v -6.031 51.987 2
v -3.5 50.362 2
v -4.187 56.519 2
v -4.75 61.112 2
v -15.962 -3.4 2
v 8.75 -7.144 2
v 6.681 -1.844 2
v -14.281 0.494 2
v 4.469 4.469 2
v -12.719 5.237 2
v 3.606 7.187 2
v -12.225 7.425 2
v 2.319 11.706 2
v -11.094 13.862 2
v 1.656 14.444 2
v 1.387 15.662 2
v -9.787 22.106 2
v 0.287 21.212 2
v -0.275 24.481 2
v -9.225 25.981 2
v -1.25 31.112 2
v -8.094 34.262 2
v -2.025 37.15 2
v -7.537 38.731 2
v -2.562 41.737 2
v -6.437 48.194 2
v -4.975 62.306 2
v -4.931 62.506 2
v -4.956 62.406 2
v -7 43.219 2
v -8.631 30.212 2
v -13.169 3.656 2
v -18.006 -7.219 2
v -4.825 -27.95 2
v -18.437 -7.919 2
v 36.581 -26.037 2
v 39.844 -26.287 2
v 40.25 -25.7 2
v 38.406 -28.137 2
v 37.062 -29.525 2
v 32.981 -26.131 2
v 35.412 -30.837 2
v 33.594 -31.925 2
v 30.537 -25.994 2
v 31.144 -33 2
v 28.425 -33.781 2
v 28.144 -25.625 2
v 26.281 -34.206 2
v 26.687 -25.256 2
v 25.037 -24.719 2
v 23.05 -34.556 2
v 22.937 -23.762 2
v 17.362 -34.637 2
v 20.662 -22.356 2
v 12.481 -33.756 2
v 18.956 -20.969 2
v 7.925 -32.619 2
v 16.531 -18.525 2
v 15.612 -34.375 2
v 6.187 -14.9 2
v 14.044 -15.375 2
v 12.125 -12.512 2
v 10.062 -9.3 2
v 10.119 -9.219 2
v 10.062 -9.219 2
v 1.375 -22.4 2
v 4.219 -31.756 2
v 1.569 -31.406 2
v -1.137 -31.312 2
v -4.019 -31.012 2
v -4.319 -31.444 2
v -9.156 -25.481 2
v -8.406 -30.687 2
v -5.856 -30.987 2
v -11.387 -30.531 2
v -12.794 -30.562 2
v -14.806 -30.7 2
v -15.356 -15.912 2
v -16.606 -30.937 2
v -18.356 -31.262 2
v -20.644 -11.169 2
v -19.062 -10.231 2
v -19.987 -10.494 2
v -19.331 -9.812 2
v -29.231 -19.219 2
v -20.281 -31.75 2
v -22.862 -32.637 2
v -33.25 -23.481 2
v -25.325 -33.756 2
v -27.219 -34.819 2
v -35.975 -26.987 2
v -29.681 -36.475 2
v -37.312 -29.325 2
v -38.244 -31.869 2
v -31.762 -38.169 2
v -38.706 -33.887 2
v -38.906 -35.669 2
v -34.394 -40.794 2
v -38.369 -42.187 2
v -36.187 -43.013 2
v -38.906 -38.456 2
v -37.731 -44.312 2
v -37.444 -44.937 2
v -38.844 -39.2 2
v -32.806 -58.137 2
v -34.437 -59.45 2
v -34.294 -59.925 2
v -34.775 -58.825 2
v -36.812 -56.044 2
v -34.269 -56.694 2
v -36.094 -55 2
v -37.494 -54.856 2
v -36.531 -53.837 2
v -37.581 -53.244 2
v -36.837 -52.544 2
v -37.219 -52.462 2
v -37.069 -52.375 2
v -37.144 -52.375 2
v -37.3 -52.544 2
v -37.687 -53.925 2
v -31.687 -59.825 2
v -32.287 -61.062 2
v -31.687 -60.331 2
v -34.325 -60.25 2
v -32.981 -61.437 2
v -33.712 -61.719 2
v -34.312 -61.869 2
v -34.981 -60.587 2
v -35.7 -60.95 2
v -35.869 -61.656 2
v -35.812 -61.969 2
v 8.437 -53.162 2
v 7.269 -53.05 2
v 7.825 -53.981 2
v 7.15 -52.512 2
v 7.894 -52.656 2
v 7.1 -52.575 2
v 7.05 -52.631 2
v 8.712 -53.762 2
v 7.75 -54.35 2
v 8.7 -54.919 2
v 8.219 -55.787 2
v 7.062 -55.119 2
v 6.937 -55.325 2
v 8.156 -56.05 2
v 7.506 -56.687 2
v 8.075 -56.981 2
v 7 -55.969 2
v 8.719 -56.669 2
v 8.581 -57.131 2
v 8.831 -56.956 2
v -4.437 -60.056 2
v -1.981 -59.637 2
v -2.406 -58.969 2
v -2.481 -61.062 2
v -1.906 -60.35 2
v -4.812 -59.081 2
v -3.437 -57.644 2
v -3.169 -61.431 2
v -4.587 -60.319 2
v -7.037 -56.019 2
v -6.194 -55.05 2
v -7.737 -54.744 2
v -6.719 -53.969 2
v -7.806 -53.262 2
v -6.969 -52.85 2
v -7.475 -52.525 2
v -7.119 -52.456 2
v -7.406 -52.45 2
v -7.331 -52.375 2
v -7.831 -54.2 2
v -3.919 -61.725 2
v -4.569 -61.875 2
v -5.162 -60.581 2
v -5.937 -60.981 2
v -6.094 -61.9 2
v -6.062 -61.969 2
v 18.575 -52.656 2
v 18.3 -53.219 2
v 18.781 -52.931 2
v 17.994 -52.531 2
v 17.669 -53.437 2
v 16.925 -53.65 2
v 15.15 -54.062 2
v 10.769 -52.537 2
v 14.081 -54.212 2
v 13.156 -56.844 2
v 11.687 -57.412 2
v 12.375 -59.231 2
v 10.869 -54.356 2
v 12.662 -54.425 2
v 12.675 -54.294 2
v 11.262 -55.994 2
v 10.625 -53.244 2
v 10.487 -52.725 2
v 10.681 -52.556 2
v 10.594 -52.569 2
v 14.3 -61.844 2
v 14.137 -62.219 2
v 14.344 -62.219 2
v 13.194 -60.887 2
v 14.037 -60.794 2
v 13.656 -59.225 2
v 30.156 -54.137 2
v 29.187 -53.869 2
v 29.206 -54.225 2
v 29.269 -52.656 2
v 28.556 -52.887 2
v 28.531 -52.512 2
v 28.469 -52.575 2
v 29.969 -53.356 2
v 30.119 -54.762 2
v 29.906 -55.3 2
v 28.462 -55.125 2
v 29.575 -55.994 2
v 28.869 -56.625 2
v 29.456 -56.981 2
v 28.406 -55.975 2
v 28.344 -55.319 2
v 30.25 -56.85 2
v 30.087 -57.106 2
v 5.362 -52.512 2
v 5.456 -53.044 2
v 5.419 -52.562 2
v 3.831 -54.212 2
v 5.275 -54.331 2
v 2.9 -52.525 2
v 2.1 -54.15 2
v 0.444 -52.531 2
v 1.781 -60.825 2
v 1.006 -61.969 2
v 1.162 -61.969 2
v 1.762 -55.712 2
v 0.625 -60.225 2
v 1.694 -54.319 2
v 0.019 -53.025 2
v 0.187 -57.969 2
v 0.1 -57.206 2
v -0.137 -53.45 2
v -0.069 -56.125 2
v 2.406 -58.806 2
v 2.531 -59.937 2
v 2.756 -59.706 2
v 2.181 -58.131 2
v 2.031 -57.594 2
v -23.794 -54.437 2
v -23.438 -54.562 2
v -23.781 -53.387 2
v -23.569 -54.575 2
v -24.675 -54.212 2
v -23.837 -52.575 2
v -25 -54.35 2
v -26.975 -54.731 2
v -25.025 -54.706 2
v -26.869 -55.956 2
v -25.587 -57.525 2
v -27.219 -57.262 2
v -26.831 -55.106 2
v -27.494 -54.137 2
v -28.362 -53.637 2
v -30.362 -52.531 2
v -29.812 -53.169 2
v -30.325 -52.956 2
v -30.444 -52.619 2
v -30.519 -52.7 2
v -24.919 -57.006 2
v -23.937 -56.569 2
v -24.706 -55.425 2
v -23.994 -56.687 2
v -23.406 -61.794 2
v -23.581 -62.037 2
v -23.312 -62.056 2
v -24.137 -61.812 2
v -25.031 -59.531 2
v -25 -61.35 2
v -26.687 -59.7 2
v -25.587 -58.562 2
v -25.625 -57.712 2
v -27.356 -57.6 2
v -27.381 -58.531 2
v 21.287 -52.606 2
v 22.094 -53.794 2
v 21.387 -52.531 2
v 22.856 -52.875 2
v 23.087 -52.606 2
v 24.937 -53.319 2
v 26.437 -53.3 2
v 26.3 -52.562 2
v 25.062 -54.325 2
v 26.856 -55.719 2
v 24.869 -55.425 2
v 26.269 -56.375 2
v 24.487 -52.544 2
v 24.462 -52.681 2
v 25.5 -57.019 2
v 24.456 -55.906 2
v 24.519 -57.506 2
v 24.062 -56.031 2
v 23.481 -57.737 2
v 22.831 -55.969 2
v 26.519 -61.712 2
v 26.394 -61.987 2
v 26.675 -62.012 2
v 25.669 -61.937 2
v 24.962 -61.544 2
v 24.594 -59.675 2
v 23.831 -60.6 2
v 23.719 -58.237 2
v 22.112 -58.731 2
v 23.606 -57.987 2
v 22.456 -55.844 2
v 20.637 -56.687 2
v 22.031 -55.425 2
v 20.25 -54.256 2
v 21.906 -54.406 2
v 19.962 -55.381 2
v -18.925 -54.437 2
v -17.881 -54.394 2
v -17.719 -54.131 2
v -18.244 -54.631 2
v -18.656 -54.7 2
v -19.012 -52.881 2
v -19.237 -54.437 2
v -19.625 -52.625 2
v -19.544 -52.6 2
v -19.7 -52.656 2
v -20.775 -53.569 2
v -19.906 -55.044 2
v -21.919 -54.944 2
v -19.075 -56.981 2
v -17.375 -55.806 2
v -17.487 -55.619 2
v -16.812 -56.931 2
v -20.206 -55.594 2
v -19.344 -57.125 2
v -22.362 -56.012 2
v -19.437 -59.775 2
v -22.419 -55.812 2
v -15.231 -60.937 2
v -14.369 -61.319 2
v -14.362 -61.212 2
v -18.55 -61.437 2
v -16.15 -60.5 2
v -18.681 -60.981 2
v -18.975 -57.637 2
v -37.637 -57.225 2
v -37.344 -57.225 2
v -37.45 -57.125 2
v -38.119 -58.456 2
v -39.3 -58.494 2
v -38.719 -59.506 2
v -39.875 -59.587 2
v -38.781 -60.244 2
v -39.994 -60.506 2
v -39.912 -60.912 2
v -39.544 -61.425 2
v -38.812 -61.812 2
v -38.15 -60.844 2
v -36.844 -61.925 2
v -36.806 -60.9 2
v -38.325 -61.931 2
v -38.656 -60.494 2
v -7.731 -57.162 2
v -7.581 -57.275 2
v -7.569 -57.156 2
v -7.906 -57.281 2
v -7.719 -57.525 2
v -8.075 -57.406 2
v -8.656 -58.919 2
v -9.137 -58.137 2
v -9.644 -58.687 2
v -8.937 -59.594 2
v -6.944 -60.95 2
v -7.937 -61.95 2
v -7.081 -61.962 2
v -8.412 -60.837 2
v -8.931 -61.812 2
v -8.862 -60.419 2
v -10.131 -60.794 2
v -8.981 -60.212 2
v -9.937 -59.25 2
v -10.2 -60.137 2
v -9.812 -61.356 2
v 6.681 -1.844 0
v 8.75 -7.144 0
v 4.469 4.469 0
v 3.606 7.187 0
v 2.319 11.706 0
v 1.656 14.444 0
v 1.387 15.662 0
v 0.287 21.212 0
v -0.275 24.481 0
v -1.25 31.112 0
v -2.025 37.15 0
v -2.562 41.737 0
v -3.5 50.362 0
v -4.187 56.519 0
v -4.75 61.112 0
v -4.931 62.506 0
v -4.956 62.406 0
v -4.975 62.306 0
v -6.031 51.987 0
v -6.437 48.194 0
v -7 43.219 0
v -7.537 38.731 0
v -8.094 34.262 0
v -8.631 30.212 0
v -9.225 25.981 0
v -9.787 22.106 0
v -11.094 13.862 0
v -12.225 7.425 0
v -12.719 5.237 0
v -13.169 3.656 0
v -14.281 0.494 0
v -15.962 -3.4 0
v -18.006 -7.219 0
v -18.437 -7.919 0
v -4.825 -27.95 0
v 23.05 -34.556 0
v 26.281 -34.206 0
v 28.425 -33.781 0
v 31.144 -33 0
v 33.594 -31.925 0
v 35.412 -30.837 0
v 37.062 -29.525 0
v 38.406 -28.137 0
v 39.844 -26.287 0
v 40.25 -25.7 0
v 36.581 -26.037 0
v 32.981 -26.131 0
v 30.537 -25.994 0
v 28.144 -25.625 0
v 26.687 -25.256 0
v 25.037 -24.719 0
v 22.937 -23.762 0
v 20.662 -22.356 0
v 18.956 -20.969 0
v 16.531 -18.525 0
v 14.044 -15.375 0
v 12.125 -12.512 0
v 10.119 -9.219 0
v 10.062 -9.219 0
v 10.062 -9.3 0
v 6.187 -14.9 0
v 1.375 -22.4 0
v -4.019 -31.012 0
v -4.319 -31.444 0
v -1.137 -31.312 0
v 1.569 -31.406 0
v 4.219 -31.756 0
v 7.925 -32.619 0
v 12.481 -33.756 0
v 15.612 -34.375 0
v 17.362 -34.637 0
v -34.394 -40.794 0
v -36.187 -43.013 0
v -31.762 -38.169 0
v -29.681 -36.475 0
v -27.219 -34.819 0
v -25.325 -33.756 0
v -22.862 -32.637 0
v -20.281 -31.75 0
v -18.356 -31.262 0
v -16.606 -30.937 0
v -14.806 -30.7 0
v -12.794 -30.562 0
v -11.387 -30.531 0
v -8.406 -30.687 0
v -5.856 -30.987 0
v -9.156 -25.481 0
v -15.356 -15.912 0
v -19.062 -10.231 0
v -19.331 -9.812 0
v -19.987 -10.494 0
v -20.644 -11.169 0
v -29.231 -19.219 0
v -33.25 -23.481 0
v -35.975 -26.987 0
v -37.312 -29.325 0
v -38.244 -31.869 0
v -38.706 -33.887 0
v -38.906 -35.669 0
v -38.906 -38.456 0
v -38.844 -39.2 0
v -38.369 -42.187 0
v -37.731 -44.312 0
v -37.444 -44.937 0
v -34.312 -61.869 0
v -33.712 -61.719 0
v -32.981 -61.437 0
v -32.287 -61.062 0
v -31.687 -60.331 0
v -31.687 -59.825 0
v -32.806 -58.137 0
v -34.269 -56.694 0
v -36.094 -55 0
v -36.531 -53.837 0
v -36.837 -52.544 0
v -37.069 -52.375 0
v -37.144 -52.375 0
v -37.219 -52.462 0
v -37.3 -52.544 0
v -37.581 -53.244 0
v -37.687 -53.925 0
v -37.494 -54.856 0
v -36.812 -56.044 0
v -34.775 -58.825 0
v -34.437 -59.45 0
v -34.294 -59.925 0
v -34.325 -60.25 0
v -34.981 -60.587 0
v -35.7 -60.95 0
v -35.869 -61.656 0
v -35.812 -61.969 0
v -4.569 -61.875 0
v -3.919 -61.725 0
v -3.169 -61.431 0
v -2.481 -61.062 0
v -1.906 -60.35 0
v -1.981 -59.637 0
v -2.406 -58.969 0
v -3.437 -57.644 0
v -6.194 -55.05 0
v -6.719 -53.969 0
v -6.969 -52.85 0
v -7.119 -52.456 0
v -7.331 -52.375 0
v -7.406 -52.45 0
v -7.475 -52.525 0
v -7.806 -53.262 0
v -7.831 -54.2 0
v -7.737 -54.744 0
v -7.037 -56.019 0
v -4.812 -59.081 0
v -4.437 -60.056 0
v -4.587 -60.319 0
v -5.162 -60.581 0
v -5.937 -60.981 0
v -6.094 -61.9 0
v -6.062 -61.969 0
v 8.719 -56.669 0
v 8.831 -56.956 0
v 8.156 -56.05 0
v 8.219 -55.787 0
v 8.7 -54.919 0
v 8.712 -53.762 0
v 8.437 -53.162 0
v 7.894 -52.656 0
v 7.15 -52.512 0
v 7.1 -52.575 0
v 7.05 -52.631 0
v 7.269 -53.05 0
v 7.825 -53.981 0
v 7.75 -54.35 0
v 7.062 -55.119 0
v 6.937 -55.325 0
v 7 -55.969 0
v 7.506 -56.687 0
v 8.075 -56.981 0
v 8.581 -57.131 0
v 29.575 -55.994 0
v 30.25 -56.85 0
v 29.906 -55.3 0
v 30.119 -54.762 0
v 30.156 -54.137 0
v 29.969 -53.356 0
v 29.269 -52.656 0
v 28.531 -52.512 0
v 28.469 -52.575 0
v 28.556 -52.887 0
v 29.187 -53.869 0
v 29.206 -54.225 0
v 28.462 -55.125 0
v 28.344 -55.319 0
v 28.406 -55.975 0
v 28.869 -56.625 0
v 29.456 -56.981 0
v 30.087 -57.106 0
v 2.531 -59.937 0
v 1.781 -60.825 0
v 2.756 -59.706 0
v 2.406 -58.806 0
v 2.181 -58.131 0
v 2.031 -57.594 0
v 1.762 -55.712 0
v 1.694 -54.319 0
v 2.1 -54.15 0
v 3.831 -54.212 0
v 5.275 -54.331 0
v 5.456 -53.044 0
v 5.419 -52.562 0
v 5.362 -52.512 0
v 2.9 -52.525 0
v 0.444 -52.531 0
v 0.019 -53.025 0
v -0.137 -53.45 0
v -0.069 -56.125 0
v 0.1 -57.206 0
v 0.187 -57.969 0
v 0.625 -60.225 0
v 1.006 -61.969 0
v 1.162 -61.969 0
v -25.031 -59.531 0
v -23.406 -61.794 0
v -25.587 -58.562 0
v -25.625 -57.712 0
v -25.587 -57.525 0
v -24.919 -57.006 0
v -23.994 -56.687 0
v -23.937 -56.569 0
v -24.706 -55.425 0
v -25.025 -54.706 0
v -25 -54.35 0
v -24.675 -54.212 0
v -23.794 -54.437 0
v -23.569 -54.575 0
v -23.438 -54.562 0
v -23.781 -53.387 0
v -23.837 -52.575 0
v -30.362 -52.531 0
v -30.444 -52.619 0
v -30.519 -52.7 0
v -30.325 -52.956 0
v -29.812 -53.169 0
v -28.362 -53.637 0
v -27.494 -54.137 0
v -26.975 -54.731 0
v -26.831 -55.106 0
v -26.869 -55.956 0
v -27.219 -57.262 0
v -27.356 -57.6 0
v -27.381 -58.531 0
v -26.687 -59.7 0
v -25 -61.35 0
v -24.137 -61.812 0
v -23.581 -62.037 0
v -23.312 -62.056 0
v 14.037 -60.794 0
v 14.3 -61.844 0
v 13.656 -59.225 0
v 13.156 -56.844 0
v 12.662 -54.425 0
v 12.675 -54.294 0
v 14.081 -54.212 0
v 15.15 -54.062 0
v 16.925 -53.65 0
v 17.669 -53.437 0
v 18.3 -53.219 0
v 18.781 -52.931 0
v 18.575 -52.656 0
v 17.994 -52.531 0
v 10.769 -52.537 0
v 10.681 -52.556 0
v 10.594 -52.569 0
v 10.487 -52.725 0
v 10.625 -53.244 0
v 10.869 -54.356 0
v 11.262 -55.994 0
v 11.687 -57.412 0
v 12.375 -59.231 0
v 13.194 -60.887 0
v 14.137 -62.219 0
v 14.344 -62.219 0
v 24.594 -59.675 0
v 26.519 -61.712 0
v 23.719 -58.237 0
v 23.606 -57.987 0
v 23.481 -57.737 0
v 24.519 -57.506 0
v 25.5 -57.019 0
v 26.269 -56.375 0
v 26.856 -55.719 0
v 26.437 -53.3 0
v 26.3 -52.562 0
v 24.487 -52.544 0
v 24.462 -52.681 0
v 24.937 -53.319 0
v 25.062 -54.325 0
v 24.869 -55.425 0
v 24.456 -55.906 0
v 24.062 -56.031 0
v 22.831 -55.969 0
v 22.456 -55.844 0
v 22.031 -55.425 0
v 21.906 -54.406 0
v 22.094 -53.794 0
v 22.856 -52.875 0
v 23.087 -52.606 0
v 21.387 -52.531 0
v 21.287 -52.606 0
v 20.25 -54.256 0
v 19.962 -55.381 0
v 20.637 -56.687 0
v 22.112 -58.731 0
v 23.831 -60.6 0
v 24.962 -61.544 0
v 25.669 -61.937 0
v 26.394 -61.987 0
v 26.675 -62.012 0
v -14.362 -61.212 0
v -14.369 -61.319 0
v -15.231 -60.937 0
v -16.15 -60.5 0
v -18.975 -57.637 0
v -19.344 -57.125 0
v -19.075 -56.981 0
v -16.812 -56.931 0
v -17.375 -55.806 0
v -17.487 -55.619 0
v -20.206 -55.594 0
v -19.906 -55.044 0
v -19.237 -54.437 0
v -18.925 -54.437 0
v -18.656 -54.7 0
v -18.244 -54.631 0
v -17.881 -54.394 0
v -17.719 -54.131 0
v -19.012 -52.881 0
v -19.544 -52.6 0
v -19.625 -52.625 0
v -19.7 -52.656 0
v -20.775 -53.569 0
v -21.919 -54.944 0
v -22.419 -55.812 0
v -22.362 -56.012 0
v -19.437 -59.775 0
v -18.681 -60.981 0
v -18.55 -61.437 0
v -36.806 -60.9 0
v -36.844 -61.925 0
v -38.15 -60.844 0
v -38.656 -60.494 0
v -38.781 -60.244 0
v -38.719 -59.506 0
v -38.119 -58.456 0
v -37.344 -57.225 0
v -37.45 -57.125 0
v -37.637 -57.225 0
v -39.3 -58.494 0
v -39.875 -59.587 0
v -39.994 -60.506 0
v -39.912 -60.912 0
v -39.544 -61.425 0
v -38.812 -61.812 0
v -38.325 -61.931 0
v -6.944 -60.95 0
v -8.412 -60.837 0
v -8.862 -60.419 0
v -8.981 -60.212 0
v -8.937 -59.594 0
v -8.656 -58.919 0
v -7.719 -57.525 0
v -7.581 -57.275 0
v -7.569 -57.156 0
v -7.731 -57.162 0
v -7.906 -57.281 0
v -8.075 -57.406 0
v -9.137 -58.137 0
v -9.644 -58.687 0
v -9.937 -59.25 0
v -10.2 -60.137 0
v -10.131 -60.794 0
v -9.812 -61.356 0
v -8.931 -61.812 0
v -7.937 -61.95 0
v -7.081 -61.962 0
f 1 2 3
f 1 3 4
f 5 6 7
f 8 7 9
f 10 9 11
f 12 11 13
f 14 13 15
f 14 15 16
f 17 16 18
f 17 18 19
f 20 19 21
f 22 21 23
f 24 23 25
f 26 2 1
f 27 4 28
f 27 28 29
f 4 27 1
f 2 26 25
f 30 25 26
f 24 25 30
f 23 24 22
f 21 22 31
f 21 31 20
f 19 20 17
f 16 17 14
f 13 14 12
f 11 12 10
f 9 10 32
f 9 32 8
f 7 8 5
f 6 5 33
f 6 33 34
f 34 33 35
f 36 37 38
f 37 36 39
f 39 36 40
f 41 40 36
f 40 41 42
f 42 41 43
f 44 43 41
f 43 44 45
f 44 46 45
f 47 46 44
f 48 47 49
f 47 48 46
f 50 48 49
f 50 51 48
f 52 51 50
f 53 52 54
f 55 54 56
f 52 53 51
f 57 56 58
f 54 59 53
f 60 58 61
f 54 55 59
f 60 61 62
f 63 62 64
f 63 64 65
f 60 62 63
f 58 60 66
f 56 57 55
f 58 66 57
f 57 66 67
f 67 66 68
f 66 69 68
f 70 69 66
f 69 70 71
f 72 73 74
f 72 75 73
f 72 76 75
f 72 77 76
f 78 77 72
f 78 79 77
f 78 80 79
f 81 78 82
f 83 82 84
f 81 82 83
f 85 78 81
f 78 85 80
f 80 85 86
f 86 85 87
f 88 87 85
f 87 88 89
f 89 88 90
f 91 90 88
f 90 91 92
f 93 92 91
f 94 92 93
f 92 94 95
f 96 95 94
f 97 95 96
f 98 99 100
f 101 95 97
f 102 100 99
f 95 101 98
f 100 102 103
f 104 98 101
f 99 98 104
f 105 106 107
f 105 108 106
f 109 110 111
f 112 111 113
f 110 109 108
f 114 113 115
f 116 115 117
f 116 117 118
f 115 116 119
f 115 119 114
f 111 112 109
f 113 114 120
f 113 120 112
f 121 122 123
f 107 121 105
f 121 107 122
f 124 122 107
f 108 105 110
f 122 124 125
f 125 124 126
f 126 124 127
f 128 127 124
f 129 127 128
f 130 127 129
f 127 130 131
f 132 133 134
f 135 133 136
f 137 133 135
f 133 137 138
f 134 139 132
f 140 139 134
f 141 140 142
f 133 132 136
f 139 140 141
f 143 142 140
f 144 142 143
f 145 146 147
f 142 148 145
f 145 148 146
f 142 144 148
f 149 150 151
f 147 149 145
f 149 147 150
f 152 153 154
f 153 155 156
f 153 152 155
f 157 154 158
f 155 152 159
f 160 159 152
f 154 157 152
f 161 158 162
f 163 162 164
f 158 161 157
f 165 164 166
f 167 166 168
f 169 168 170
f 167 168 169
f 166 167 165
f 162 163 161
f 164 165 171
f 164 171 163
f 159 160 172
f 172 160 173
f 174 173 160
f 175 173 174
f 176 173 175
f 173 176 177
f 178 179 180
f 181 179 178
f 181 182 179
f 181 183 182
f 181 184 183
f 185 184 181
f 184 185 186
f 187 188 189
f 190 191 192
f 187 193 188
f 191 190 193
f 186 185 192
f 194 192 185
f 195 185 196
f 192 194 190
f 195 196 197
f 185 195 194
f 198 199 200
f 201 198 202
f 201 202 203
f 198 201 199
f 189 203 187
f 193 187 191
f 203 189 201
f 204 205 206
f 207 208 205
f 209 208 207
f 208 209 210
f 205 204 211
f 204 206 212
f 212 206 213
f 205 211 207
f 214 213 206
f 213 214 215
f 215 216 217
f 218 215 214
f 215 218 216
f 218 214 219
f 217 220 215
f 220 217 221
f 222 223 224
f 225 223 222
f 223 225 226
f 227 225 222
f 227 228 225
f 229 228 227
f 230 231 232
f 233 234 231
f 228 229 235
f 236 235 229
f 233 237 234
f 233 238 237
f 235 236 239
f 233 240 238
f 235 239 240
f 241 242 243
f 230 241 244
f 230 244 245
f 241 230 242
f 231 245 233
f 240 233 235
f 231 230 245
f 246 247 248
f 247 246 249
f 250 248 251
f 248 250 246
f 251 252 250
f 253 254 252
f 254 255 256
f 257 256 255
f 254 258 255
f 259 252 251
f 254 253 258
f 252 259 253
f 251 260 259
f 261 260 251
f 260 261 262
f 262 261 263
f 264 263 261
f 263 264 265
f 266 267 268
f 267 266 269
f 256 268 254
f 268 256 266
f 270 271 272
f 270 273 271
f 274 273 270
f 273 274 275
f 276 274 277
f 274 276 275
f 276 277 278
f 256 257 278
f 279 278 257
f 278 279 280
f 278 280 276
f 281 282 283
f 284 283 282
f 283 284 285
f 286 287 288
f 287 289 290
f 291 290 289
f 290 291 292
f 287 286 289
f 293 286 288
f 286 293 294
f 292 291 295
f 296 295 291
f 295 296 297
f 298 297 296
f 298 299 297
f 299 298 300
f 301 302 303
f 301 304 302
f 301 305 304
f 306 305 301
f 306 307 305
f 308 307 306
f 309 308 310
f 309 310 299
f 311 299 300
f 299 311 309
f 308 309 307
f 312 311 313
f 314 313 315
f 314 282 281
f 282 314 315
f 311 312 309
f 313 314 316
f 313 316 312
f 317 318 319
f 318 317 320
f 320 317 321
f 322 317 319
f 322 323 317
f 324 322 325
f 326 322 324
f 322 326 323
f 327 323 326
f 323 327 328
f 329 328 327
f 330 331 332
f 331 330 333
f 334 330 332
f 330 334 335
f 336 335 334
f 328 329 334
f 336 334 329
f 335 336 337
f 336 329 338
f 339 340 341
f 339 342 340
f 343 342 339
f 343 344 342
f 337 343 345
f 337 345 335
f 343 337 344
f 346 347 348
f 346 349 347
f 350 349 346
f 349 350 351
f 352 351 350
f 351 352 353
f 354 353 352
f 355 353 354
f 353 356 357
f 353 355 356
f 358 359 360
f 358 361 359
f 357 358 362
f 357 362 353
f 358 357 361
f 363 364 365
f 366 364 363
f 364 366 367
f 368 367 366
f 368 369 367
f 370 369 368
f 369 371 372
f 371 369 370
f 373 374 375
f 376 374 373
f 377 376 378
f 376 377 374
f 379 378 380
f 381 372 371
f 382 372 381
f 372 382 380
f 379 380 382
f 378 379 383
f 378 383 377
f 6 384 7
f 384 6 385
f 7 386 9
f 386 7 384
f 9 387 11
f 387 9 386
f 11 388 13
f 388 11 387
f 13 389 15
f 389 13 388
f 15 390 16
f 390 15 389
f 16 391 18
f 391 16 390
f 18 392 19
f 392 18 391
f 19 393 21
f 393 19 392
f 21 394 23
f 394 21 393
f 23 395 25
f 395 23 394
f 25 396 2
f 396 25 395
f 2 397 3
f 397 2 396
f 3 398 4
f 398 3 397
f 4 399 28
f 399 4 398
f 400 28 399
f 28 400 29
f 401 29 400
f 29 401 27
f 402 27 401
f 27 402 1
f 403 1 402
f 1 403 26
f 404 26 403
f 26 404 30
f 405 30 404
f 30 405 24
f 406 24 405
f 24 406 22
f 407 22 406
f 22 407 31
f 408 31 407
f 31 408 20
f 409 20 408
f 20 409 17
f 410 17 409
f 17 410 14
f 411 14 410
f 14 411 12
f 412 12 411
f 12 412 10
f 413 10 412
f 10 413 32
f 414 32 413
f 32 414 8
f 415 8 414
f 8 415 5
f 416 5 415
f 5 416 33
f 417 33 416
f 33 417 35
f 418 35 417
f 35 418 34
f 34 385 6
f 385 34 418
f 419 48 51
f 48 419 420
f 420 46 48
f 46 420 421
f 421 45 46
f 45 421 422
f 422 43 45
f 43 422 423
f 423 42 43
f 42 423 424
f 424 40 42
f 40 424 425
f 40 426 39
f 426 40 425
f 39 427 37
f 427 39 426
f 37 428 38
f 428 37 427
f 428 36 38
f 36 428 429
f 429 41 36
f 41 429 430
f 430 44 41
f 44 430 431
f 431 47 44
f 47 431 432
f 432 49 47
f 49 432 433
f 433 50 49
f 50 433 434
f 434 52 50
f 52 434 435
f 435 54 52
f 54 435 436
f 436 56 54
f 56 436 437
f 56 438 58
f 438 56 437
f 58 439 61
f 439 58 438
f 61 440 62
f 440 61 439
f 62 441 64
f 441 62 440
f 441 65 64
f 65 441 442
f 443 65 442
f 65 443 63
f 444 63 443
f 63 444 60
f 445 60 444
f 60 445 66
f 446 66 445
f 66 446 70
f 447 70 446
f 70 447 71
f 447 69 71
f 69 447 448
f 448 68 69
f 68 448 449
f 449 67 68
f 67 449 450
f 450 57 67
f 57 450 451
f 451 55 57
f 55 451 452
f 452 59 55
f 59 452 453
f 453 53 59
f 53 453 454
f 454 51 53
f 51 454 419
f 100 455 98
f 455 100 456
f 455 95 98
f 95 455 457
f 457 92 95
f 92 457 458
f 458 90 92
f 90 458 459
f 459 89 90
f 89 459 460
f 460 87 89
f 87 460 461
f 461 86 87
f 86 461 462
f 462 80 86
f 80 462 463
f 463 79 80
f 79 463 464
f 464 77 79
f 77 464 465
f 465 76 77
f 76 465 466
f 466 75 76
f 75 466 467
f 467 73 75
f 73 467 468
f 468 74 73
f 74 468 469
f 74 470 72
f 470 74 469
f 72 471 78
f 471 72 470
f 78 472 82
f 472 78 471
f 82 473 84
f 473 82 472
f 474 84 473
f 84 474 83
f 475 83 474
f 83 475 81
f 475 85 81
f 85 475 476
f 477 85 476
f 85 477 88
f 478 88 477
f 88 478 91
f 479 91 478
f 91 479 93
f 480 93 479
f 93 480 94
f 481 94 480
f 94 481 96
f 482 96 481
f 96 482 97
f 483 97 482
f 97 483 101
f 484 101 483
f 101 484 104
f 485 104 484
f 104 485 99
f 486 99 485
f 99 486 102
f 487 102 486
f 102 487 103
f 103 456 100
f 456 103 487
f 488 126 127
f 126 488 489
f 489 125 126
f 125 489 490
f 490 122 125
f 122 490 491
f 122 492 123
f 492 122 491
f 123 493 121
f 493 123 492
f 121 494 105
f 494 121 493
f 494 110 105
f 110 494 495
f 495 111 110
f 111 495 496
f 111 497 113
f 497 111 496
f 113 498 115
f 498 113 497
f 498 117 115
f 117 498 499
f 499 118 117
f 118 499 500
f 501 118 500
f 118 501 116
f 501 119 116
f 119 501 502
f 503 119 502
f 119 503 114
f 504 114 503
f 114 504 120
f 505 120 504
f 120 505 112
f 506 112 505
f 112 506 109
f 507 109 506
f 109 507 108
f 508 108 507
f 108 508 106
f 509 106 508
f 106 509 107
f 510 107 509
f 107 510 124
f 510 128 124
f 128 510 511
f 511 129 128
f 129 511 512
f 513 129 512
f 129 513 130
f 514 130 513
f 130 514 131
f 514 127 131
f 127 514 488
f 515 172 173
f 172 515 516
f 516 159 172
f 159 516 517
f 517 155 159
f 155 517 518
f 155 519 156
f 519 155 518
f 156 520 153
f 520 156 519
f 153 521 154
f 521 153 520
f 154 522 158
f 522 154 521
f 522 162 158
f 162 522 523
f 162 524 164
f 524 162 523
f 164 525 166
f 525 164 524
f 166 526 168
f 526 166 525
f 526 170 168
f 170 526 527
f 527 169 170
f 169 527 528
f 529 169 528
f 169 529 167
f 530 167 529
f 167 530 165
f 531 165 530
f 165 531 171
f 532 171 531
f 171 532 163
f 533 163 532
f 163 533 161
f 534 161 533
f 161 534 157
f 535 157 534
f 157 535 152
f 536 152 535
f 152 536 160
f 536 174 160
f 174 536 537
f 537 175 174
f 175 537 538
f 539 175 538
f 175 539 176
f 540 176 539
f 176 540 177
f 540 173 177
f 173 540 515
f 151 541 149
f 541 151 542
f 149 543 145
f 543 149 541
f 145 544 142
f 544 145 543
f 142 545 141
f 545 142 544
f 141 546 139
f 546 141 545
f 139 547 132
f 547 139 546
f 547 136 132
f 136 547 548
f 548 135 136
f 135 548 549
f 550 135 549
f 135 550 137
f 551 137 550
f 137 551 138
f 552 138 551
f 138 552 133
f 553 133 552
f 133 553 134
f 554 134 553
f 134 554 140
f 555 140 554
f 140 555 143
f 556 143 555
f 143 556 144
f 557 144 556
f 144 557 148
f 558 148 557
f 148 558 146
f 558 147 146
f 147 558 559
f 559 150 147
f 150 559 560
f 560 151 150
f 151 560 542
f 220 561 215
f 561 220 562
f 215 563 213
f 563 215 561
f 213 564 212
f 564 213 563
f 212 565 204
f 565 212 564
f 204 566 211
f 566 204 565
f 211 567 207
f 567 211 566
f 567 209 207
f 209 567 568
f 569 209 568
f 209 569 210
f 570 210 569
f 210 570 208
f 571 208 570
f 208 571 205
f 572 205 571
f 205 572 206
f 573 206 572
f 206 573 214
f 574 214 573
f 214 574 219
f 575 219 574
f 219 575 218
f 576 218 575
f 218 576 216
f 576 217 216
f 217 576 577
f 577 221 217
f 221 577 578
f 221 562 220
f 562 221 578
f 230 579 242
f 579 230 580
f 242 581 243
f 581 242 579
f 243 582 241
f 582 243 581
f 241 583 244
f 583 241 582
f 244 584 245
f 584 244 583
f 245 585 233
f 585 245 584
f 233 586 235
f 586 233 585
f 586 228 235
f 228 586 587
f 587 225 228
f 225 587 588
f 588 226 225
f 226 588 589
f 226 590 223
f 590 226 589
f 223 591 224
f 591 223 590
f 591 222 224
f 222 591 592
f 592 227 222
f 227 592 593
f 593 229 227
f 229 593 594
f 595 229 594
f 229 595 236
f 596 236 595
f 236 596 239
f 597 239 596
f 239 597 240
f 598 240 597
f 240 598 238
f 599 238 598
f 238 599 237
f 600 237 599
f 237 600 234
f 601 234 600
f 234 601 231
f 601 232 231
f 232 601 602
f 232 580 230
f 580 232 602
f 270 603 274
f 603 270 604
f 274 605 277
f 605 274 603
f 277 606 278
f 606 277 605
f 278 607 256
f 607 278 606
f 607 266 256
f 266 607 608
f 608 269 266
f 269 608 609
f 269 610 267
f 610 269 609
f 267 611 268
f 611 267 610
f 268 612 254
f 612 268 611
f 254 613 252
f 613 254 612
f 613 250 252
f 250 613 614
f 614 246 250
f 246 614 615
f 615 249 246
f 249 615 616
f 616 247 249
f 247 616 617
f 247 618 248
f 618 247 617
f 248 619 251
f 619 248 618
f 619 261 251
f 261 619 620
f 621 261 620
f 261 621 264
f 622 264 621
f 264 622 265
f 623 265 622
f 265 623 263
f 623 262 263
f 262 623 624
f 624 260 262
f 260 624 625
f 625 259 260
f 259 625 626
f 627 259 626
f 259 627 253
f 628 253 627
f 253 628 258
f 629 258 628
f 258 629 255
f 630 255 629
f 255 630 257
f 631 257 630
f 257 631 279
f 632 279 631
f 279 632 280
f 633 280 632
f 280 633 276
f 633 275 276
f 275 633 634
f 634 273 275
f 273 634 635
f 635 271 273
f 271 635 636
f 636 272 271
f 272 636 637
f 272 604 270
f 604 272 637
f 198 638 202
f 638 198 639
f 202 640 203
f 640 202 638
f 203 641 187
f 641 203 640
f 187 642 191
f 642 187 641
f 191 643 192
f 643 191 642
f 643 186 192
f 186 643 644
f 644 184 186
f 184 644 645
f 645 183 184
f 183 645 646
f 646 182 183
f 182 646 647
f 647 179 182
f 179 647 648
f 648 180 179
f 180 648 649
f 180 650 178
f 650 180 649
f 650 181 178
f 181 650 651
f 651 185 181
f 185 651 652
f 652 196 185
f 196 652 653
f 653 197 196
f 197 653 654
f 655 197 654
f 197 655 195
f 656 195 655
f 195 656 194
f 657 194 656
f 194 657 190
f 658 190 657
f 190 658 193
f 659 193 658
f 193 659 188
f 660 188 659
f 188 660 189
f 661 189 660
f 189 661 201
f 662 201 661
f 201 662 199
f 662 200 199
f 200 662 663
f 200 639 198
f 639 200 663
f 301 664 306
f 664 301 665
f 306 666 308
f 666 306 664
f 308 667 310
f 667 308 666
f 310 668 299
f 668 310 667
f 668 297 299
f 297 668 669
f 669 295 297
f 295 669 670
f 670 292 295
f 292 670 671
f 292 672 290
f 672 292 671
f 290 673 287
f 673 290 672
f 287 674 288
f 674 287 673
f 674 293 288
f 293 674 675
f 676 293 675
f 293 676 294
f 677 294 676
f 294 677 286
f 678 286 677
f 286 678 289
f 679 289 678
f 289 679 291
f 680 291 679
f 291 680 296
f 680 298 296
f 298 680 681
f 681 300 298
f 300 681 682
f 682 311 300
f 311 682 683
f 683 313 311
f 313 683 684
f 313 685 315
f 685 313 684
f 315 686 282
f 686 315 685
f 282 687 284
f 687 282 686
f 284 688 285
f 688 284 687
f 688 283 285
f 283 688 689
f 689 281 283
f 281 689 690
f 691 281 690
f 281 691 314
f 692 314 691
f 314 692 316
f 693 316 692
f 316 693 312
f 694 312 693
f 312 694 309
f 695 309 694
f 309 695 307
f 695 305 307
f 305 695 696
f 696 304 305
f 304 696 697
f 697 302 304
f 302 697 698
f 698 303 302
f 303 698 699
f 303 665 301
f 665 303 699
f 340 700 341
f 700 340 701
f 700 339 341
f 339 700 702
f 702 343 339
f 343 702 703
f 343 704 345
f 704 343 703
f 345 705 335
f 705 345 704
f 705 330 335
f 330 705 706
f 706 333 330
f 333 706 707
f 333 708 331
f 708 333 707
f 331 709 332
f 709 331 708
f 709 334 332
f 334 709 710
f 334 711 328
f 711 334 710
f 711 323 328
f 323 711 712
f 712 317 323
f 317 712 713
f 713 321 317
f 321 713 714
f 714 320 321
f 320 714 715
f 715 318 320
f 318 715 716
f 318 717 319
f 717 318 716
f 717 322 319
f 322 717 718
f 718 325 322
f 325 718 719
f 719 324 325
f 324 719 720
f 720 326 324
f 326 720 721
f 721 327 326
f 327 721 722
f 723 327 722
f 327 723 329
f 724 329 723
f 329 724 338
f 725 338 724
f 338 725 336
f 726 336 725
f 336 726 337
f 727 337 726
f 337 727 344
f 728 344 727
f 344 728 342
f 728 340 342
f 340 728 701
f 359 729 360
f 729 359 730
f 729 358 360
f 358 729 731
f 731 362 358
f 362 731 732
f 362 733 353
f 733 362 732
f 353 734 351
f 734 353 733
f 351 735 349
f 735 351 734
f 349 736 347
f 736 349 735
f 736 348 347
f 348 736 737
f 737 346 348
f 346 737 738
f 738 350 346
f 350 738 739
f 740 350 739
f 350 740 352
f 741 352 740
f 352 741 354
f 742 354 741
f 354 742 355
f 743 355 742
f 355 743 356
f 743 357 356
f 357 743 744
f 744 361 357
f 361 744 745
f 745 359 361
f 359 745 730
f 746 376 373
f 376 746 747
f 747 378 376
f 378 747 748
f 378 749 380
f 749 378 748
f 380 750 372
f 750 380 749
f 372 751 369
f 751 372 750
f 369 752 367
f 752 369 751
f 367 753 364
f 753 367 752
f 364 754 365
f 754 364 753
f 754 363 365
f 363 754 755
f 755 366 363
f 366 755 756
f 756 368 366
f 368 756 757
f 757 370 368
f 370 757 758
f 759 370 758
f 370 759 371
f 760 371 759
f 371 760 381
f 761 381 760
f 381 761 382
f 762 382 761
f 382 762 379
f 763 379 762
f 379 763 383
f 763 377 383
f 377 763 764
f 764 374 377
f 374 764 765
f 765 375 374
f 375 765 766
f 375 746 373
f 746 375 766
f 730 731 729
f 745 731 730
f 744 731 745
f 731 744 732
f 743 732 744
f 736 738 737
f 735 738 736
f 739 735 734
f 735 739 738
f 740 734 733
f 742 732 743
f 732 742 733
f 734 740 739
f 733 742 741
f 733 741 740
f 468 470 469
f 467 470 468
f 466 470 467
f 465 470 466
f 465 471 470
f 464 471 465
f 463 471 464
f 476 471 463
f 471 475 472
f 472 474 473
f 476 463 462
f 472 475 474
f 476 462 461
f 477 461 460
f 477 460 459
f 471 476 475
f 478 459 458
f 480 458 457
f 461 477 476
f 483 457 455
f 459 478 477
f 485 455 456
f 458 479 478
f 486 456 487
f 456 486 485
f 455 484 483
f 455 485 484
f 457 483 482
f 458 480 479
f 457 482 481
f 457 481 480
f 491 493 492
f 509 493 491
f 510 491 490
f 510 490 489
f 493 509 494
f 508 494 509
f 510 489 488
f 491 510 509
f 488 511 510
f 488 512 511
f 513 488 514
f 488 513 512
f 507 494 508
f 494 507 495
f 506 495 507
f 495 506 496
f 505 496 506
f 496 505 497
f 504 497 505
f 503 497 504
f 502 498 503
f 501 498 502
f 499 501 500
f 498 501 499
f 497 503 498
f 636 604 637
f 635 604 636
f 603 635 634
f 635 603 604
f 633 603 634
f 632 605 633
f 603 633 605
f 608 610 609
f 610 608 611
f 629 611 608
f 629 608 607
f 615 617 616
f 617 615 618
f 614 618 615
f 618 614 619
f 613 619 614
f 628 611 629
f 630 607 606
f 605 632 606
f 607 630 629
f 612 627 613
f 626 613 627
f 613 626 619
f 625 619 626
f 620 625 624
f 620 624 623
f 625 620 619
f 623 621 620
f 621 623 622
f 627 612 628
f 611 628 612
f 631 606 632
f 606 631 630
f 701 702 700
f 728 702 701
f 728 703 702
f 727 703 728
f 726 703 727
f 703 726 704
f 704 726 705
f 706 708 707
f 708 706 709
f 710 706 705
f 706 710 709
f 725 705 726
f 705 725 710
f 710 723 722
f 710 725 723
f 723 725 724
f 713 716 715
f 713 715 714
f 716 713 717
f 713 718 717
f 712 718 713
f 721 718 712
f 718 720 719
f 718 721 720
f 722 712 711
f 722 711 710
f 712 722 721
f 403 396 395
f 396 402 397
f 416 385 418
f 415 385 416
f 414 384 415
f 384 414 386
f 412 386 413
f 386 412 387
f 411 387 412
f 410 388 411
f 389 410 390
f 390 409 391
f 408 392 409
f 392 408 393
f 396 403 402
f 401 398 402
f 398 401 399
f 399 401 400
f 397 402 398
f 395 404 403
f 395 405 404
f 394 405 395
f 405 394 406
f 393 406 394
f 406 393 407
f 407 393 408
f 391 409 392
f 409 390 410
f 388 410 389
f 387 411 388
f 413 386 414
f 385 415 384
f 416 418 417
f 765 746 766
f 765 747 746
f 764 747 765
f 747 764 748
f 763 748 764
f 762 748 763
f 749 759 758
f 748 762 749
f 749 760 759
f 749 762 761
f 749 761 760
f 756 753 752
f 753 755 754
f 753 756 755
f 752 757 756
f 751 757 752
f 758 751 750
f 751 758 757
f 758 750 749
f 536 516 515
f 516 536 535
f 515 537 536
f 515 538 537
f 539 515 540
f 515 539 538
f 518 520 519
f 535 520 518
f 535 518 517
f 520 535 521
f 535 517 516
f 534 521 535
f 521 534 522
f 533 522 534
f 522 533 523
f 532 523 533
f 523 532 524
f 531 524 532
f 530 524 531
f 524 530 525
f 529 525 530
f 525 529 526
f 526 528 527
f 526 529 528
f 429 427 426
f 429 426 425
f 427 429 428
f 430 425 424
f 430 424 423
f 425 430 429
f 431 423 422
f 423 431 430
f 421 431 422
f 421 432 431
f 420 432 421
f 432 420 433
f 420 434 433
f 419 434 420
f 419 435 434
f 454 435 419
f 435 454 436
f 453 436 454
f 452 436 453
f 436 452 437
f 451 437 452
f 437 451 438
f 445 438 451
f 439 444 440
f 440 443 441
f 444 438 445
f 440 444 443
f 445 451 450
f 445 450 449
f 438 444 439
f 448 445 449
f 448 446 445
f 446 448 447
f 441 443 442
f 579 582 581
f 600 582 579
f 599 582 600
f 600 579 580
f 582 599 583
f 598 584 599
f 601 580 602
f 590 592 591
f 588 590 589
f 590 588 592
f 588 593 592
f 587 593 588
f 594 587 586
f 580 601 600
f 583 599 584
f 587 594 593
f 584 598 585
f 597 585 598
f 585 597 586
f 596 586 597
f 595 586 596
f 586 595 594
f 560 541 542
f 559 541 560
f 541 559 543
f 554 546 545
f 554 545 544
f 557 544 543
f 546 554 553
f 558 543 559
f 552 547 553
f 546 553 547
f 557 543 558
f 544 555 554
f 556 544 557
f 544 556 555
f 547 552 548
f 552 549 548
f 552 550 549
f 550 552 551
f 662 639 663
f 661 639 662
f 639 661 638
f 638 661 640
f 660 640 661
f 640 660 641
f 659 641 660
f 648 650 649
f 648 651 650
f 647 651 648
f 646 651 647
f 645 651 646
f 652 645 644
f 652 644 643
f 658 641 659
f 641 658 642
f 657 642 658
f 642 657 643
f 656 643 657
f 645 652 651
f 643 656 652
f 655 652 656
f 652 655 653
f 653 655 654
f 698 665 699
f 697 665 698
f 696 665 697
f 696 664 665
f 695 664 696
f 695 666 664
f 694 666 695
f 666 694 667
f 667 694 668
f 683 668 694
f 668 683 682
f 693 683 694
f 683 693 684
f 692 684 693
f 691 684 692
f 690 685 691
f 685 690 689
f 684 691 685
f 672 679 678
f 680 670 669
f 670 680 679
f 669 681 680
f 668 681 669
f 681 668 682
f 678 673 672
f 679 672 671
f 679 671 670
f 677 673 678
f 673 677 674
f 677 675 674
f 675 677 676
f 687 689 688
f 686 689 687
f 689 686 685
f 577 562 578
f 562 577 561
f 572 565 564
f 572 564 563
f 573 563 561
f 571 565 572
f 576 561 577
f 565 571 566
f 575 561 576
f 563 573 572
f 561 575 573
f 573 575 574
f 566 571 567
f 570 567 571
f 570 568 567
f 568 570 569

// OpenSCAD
module 61a49e6b5466c818e99b627d7e38d7b3_1()
{
 /* Generated by trace2scad version 20150415
    http://aggregate.org/MAKE/TRACE2SCAD/
    Optimized model has 387/4796 original points
 */
 color([0.48, 0.48, 0.48])
 assign(minx=0) /* polygon minx=39 */
 assign(miny=0) /* polygon miny=45 */
 assign(maxx=12880) /* polygon maxx=12880 */
 assign(maxy=20000) /* polygon maxy=20001 */
 assign(dx=maxx-minx)
 assign(dy=maxy-miny)
 assign(maxd=((dx>dy)?dx:dy))
 scale([1/maxd, 1/maxd, 1])
 translate([-minx-dx/2, -miny-dy/2, 0])
 linear_extrude(height=1, convexity=387)
 union() {
  union() {
   polygon([[5647,19985],[5644,19969],[5475,18318],[5410,17711],[5320,16915],[5234,16197],[5145,15482],[5059,14834],[4964,14157],[4874,13537],[4665,12218],[4484,11188],[4405,10838],[4333,10585],[4155,10079],[3886,9456],[3559,8845],[3490,8733],[5668,5528],[7840,8857],[7509,9705],[7155,10715],[7017,11150],[6811,11873],[6705,12311],[6662,12506],[6486,13394],[6396,13917],[6240,14978],[6116,15944],[6030,16678],[5880,18058],[5770,19043],[5680,19778],[5651,20001]], convexity=6);
   polygon([[8050,8518],[8050,8512],[7430,7616],[6660,6416],[5797,5038],[5749,4969],[6258,4990],[6691,4975],[7115,4919],[7708,4781],[8437,4599],[8938,4500],[9218,4458],[10128,4471],[10645,4527],[10988,4595],[11423,4720],[11815,4892],[12106,5066],[12370,5276],[12585,5498],[12815,5794],[12880,5888],[12293,5834],[11717,5819],[11326,5841],[10943,5900],[10710,5959],[10446,6045],[10110,6198],[9746,6423],[9473,6645],[9085,7036],[8687,7540],[8380,7998],[8059,8525],[8050,8525]], convexity=9);
   polygon([[3242,8321],[3137,8213],[1763,6925],[1120,6243],[684,5682],[470,5308],[321,4901],[247,4578],[215,4293],[215,3847],[225,3728],[301,3250],[403,2910],[449,2810],[650,3118],[937,3473],[1358,3893],[1691,4164],[2085,4429],[2388,4599],[2782,4778],[3195,4920],[3503,4998],[3783,5050],[4071,5088],[4393,5110],[4618,5115],[5095,5090],[5503,5042],[4975,5923],[3983,7454],[3390,8363],[3347,8430]], convexity=7);
   polygon([[485,1606],[472,1593],[427,1481],[410,1372],[441,1223],[550,1033],[876,588],[930,488],[953,412],[948,360],[843,306],[728,248],[701,135],[710,85],[950,101],[1046,125],[1163,170],[1274,230],[1370,347],[1370,428],[1191,698],[957,929],[665,1200],[595,1386],[546,1593],[509,1620],[497,1620]], convexity=8);
   polygon([[5255,1608],[5244,1596],[5191,1478],[5187,1328],[5202,1241],[5314,1037],[5670,547],[5730,391],[5706,349],[5614,307],[5490,243],[5465,96],[5470,85],[5709,100],[5813,124],[5933,171],[6043,230],[6135,344],[6123,458],[6055,565],[5890,777],[5449,1192],[5365,1365],[5325,1544],[5301,1607],[5267,1620]], convexity=8);
   polygon([[6904,1596],[6511,1595],[6443,1516],[6418,1448],[6429,1020],[6456,847],[6470,725],[6540,364],[6601,85],[6626,85],[6725,268],[6845,410],[6881,447],[6825,591],[6789,699],[6765,785],[6722,1086],[6711,1309],[6776,1336],[7053,1326],[7284,1307],[7313,1513],[7307,1590],[7298,1598]], convexity=10);
   polygon([[7576,1588],[7568,1579],[7603,1512],[7692,1363],[7680,1304],[7570,1181],[7550,1148],[7560,1045],[7641,930],[7732,883],[7813,859],[7853,887],[7835,933],[7745,1032],[7755,1074],[7832,1213],[7834,1398],[7790,1494],[7703,1575],[7584,1598]], convexity=10);
   polygon([[11000,1593],[10995,1588],[11009,1538],[11110,1381],[11113,1324],[10994,1180],[10975,1149],[10985,1044],[11059,940],[11153,883],[11254,863],[11280,904],[11172,1041],[11225,1152],[11259,1238],[11265,1338],[11235,1463],[11123,1575],[11005,1598]], convexity=10);
   polygon([[1569,1581],[1557,1568],[1588,1527],[1670,1493],[1902,1418],[2041,1338],[2124,1243],[2147,1183],[2141,1047],[2085,838],[2063,784],[2059,635],[2170,448],[2440,184],[2578,110],[2667,74],[2710,71],[2695,113],[2435,475],[2346,630],[2340,766],[2346,796],[2453,879],[2601,930],[2610,949],[2487,1132],[2436,1247],[2440,1304],[2492,1326],[2633,1290],[2669,1268],[2690,1270],[2635,1458],[2626,1588],[1582,1595]], convexity=13);
   polygon([[8149,1591],[8135,1589],[8118,1564],[8140,1481],[8179,1303],[8242,1041],[8310,814],[8420,523],[8551,258],[8702,45],[8735,45],[8728,105],[8686,273],[8625,524],[8545,905],[8466,1292],[8468,1313],[8693,1326],[8864,1350],[9148,1416],[9267,1450],[9368,1485],[9445,1531],[9412,1575],[9319,1595],[8163,1594]], convexity=9);
   polygon([[9854,1589],[9846,1583],[9680,1319],[9634,1139],[9742,930],[9978,603],[10253,304],[10434,153],[10547,90],[10663,82],[10708,78],[10683,126],[10375,452],[10235,682],[10217,722],[10197,762],[10363,799],[10520,877],[10643,980],[10737,1085],[10670,1472],[10648,1590],[10358,1593],[10354,1571],[10430,1469],[10450,1308],[10419,1132],[10353,1055],[10290,1035],[10093,1045],[10033,1065],[9965,1132],[9945,1295],[9975,1393],[10097,1540],[10134,1583],[9862,1595]], convexity=13);
   polygon([[3300,1580],[3288,1575],[3116,1429],[2933,1209],[2853,1070],[2862,1038],[3330,436],[3451,243],[3472,170],[4141,189],[4142,206],[4003,250],[3856,320],[3404,778],[3345,860],[3388,883],[3750,891],[3660,1071],[3642,1101],[3207,1105],[3255,1193],[3362,1290],[3412,1290],[3455,1248],[3521,1259],[3579,1297],[3605,1339],[3398,1539],[3313,1584]], convexity=12);
   polygon([[433,852],[418,844],[152,641],[60,466],[41,319],[54,254],[113,172],[230,110],[308,91],[545,92],[551,256],[336,265],[255,321],[235,361],[245,479],[341,647],[465,844],[448,860]], convexity=8);
   polygon([[5175,835],[5148,815],[4978,698],[4897,610],[4850,520],[4808,378],[4819,273],[4870,183],[5011,110],[5170,88],[5307,86],[5329,248],[5094,266],[5022,333],[5003,366],[5010,465],[5055,573],[5205,796],[5227,836],[5229,855],[5203,854]], convexity=8);
  }
 }
}

module 61a49e6b5466c818e99b627d7e38d7b3()
{
 /* all layers combined, scaled to within a 1mm cube */
 scale([1, 1, 1/1])
 difference() {
  union() {
   scale([1,1,2]) translate([0,0,-0.5]) 61a49e6b5466c818e99b627d7e38d7b3_1();
  }
  translate([0,0,-2]) cube([2,2,4],center=true);
 }
}

scale([125, 125, 2]) {
	61a49e6b5466c818e99b627d7e38d7b3();
}
